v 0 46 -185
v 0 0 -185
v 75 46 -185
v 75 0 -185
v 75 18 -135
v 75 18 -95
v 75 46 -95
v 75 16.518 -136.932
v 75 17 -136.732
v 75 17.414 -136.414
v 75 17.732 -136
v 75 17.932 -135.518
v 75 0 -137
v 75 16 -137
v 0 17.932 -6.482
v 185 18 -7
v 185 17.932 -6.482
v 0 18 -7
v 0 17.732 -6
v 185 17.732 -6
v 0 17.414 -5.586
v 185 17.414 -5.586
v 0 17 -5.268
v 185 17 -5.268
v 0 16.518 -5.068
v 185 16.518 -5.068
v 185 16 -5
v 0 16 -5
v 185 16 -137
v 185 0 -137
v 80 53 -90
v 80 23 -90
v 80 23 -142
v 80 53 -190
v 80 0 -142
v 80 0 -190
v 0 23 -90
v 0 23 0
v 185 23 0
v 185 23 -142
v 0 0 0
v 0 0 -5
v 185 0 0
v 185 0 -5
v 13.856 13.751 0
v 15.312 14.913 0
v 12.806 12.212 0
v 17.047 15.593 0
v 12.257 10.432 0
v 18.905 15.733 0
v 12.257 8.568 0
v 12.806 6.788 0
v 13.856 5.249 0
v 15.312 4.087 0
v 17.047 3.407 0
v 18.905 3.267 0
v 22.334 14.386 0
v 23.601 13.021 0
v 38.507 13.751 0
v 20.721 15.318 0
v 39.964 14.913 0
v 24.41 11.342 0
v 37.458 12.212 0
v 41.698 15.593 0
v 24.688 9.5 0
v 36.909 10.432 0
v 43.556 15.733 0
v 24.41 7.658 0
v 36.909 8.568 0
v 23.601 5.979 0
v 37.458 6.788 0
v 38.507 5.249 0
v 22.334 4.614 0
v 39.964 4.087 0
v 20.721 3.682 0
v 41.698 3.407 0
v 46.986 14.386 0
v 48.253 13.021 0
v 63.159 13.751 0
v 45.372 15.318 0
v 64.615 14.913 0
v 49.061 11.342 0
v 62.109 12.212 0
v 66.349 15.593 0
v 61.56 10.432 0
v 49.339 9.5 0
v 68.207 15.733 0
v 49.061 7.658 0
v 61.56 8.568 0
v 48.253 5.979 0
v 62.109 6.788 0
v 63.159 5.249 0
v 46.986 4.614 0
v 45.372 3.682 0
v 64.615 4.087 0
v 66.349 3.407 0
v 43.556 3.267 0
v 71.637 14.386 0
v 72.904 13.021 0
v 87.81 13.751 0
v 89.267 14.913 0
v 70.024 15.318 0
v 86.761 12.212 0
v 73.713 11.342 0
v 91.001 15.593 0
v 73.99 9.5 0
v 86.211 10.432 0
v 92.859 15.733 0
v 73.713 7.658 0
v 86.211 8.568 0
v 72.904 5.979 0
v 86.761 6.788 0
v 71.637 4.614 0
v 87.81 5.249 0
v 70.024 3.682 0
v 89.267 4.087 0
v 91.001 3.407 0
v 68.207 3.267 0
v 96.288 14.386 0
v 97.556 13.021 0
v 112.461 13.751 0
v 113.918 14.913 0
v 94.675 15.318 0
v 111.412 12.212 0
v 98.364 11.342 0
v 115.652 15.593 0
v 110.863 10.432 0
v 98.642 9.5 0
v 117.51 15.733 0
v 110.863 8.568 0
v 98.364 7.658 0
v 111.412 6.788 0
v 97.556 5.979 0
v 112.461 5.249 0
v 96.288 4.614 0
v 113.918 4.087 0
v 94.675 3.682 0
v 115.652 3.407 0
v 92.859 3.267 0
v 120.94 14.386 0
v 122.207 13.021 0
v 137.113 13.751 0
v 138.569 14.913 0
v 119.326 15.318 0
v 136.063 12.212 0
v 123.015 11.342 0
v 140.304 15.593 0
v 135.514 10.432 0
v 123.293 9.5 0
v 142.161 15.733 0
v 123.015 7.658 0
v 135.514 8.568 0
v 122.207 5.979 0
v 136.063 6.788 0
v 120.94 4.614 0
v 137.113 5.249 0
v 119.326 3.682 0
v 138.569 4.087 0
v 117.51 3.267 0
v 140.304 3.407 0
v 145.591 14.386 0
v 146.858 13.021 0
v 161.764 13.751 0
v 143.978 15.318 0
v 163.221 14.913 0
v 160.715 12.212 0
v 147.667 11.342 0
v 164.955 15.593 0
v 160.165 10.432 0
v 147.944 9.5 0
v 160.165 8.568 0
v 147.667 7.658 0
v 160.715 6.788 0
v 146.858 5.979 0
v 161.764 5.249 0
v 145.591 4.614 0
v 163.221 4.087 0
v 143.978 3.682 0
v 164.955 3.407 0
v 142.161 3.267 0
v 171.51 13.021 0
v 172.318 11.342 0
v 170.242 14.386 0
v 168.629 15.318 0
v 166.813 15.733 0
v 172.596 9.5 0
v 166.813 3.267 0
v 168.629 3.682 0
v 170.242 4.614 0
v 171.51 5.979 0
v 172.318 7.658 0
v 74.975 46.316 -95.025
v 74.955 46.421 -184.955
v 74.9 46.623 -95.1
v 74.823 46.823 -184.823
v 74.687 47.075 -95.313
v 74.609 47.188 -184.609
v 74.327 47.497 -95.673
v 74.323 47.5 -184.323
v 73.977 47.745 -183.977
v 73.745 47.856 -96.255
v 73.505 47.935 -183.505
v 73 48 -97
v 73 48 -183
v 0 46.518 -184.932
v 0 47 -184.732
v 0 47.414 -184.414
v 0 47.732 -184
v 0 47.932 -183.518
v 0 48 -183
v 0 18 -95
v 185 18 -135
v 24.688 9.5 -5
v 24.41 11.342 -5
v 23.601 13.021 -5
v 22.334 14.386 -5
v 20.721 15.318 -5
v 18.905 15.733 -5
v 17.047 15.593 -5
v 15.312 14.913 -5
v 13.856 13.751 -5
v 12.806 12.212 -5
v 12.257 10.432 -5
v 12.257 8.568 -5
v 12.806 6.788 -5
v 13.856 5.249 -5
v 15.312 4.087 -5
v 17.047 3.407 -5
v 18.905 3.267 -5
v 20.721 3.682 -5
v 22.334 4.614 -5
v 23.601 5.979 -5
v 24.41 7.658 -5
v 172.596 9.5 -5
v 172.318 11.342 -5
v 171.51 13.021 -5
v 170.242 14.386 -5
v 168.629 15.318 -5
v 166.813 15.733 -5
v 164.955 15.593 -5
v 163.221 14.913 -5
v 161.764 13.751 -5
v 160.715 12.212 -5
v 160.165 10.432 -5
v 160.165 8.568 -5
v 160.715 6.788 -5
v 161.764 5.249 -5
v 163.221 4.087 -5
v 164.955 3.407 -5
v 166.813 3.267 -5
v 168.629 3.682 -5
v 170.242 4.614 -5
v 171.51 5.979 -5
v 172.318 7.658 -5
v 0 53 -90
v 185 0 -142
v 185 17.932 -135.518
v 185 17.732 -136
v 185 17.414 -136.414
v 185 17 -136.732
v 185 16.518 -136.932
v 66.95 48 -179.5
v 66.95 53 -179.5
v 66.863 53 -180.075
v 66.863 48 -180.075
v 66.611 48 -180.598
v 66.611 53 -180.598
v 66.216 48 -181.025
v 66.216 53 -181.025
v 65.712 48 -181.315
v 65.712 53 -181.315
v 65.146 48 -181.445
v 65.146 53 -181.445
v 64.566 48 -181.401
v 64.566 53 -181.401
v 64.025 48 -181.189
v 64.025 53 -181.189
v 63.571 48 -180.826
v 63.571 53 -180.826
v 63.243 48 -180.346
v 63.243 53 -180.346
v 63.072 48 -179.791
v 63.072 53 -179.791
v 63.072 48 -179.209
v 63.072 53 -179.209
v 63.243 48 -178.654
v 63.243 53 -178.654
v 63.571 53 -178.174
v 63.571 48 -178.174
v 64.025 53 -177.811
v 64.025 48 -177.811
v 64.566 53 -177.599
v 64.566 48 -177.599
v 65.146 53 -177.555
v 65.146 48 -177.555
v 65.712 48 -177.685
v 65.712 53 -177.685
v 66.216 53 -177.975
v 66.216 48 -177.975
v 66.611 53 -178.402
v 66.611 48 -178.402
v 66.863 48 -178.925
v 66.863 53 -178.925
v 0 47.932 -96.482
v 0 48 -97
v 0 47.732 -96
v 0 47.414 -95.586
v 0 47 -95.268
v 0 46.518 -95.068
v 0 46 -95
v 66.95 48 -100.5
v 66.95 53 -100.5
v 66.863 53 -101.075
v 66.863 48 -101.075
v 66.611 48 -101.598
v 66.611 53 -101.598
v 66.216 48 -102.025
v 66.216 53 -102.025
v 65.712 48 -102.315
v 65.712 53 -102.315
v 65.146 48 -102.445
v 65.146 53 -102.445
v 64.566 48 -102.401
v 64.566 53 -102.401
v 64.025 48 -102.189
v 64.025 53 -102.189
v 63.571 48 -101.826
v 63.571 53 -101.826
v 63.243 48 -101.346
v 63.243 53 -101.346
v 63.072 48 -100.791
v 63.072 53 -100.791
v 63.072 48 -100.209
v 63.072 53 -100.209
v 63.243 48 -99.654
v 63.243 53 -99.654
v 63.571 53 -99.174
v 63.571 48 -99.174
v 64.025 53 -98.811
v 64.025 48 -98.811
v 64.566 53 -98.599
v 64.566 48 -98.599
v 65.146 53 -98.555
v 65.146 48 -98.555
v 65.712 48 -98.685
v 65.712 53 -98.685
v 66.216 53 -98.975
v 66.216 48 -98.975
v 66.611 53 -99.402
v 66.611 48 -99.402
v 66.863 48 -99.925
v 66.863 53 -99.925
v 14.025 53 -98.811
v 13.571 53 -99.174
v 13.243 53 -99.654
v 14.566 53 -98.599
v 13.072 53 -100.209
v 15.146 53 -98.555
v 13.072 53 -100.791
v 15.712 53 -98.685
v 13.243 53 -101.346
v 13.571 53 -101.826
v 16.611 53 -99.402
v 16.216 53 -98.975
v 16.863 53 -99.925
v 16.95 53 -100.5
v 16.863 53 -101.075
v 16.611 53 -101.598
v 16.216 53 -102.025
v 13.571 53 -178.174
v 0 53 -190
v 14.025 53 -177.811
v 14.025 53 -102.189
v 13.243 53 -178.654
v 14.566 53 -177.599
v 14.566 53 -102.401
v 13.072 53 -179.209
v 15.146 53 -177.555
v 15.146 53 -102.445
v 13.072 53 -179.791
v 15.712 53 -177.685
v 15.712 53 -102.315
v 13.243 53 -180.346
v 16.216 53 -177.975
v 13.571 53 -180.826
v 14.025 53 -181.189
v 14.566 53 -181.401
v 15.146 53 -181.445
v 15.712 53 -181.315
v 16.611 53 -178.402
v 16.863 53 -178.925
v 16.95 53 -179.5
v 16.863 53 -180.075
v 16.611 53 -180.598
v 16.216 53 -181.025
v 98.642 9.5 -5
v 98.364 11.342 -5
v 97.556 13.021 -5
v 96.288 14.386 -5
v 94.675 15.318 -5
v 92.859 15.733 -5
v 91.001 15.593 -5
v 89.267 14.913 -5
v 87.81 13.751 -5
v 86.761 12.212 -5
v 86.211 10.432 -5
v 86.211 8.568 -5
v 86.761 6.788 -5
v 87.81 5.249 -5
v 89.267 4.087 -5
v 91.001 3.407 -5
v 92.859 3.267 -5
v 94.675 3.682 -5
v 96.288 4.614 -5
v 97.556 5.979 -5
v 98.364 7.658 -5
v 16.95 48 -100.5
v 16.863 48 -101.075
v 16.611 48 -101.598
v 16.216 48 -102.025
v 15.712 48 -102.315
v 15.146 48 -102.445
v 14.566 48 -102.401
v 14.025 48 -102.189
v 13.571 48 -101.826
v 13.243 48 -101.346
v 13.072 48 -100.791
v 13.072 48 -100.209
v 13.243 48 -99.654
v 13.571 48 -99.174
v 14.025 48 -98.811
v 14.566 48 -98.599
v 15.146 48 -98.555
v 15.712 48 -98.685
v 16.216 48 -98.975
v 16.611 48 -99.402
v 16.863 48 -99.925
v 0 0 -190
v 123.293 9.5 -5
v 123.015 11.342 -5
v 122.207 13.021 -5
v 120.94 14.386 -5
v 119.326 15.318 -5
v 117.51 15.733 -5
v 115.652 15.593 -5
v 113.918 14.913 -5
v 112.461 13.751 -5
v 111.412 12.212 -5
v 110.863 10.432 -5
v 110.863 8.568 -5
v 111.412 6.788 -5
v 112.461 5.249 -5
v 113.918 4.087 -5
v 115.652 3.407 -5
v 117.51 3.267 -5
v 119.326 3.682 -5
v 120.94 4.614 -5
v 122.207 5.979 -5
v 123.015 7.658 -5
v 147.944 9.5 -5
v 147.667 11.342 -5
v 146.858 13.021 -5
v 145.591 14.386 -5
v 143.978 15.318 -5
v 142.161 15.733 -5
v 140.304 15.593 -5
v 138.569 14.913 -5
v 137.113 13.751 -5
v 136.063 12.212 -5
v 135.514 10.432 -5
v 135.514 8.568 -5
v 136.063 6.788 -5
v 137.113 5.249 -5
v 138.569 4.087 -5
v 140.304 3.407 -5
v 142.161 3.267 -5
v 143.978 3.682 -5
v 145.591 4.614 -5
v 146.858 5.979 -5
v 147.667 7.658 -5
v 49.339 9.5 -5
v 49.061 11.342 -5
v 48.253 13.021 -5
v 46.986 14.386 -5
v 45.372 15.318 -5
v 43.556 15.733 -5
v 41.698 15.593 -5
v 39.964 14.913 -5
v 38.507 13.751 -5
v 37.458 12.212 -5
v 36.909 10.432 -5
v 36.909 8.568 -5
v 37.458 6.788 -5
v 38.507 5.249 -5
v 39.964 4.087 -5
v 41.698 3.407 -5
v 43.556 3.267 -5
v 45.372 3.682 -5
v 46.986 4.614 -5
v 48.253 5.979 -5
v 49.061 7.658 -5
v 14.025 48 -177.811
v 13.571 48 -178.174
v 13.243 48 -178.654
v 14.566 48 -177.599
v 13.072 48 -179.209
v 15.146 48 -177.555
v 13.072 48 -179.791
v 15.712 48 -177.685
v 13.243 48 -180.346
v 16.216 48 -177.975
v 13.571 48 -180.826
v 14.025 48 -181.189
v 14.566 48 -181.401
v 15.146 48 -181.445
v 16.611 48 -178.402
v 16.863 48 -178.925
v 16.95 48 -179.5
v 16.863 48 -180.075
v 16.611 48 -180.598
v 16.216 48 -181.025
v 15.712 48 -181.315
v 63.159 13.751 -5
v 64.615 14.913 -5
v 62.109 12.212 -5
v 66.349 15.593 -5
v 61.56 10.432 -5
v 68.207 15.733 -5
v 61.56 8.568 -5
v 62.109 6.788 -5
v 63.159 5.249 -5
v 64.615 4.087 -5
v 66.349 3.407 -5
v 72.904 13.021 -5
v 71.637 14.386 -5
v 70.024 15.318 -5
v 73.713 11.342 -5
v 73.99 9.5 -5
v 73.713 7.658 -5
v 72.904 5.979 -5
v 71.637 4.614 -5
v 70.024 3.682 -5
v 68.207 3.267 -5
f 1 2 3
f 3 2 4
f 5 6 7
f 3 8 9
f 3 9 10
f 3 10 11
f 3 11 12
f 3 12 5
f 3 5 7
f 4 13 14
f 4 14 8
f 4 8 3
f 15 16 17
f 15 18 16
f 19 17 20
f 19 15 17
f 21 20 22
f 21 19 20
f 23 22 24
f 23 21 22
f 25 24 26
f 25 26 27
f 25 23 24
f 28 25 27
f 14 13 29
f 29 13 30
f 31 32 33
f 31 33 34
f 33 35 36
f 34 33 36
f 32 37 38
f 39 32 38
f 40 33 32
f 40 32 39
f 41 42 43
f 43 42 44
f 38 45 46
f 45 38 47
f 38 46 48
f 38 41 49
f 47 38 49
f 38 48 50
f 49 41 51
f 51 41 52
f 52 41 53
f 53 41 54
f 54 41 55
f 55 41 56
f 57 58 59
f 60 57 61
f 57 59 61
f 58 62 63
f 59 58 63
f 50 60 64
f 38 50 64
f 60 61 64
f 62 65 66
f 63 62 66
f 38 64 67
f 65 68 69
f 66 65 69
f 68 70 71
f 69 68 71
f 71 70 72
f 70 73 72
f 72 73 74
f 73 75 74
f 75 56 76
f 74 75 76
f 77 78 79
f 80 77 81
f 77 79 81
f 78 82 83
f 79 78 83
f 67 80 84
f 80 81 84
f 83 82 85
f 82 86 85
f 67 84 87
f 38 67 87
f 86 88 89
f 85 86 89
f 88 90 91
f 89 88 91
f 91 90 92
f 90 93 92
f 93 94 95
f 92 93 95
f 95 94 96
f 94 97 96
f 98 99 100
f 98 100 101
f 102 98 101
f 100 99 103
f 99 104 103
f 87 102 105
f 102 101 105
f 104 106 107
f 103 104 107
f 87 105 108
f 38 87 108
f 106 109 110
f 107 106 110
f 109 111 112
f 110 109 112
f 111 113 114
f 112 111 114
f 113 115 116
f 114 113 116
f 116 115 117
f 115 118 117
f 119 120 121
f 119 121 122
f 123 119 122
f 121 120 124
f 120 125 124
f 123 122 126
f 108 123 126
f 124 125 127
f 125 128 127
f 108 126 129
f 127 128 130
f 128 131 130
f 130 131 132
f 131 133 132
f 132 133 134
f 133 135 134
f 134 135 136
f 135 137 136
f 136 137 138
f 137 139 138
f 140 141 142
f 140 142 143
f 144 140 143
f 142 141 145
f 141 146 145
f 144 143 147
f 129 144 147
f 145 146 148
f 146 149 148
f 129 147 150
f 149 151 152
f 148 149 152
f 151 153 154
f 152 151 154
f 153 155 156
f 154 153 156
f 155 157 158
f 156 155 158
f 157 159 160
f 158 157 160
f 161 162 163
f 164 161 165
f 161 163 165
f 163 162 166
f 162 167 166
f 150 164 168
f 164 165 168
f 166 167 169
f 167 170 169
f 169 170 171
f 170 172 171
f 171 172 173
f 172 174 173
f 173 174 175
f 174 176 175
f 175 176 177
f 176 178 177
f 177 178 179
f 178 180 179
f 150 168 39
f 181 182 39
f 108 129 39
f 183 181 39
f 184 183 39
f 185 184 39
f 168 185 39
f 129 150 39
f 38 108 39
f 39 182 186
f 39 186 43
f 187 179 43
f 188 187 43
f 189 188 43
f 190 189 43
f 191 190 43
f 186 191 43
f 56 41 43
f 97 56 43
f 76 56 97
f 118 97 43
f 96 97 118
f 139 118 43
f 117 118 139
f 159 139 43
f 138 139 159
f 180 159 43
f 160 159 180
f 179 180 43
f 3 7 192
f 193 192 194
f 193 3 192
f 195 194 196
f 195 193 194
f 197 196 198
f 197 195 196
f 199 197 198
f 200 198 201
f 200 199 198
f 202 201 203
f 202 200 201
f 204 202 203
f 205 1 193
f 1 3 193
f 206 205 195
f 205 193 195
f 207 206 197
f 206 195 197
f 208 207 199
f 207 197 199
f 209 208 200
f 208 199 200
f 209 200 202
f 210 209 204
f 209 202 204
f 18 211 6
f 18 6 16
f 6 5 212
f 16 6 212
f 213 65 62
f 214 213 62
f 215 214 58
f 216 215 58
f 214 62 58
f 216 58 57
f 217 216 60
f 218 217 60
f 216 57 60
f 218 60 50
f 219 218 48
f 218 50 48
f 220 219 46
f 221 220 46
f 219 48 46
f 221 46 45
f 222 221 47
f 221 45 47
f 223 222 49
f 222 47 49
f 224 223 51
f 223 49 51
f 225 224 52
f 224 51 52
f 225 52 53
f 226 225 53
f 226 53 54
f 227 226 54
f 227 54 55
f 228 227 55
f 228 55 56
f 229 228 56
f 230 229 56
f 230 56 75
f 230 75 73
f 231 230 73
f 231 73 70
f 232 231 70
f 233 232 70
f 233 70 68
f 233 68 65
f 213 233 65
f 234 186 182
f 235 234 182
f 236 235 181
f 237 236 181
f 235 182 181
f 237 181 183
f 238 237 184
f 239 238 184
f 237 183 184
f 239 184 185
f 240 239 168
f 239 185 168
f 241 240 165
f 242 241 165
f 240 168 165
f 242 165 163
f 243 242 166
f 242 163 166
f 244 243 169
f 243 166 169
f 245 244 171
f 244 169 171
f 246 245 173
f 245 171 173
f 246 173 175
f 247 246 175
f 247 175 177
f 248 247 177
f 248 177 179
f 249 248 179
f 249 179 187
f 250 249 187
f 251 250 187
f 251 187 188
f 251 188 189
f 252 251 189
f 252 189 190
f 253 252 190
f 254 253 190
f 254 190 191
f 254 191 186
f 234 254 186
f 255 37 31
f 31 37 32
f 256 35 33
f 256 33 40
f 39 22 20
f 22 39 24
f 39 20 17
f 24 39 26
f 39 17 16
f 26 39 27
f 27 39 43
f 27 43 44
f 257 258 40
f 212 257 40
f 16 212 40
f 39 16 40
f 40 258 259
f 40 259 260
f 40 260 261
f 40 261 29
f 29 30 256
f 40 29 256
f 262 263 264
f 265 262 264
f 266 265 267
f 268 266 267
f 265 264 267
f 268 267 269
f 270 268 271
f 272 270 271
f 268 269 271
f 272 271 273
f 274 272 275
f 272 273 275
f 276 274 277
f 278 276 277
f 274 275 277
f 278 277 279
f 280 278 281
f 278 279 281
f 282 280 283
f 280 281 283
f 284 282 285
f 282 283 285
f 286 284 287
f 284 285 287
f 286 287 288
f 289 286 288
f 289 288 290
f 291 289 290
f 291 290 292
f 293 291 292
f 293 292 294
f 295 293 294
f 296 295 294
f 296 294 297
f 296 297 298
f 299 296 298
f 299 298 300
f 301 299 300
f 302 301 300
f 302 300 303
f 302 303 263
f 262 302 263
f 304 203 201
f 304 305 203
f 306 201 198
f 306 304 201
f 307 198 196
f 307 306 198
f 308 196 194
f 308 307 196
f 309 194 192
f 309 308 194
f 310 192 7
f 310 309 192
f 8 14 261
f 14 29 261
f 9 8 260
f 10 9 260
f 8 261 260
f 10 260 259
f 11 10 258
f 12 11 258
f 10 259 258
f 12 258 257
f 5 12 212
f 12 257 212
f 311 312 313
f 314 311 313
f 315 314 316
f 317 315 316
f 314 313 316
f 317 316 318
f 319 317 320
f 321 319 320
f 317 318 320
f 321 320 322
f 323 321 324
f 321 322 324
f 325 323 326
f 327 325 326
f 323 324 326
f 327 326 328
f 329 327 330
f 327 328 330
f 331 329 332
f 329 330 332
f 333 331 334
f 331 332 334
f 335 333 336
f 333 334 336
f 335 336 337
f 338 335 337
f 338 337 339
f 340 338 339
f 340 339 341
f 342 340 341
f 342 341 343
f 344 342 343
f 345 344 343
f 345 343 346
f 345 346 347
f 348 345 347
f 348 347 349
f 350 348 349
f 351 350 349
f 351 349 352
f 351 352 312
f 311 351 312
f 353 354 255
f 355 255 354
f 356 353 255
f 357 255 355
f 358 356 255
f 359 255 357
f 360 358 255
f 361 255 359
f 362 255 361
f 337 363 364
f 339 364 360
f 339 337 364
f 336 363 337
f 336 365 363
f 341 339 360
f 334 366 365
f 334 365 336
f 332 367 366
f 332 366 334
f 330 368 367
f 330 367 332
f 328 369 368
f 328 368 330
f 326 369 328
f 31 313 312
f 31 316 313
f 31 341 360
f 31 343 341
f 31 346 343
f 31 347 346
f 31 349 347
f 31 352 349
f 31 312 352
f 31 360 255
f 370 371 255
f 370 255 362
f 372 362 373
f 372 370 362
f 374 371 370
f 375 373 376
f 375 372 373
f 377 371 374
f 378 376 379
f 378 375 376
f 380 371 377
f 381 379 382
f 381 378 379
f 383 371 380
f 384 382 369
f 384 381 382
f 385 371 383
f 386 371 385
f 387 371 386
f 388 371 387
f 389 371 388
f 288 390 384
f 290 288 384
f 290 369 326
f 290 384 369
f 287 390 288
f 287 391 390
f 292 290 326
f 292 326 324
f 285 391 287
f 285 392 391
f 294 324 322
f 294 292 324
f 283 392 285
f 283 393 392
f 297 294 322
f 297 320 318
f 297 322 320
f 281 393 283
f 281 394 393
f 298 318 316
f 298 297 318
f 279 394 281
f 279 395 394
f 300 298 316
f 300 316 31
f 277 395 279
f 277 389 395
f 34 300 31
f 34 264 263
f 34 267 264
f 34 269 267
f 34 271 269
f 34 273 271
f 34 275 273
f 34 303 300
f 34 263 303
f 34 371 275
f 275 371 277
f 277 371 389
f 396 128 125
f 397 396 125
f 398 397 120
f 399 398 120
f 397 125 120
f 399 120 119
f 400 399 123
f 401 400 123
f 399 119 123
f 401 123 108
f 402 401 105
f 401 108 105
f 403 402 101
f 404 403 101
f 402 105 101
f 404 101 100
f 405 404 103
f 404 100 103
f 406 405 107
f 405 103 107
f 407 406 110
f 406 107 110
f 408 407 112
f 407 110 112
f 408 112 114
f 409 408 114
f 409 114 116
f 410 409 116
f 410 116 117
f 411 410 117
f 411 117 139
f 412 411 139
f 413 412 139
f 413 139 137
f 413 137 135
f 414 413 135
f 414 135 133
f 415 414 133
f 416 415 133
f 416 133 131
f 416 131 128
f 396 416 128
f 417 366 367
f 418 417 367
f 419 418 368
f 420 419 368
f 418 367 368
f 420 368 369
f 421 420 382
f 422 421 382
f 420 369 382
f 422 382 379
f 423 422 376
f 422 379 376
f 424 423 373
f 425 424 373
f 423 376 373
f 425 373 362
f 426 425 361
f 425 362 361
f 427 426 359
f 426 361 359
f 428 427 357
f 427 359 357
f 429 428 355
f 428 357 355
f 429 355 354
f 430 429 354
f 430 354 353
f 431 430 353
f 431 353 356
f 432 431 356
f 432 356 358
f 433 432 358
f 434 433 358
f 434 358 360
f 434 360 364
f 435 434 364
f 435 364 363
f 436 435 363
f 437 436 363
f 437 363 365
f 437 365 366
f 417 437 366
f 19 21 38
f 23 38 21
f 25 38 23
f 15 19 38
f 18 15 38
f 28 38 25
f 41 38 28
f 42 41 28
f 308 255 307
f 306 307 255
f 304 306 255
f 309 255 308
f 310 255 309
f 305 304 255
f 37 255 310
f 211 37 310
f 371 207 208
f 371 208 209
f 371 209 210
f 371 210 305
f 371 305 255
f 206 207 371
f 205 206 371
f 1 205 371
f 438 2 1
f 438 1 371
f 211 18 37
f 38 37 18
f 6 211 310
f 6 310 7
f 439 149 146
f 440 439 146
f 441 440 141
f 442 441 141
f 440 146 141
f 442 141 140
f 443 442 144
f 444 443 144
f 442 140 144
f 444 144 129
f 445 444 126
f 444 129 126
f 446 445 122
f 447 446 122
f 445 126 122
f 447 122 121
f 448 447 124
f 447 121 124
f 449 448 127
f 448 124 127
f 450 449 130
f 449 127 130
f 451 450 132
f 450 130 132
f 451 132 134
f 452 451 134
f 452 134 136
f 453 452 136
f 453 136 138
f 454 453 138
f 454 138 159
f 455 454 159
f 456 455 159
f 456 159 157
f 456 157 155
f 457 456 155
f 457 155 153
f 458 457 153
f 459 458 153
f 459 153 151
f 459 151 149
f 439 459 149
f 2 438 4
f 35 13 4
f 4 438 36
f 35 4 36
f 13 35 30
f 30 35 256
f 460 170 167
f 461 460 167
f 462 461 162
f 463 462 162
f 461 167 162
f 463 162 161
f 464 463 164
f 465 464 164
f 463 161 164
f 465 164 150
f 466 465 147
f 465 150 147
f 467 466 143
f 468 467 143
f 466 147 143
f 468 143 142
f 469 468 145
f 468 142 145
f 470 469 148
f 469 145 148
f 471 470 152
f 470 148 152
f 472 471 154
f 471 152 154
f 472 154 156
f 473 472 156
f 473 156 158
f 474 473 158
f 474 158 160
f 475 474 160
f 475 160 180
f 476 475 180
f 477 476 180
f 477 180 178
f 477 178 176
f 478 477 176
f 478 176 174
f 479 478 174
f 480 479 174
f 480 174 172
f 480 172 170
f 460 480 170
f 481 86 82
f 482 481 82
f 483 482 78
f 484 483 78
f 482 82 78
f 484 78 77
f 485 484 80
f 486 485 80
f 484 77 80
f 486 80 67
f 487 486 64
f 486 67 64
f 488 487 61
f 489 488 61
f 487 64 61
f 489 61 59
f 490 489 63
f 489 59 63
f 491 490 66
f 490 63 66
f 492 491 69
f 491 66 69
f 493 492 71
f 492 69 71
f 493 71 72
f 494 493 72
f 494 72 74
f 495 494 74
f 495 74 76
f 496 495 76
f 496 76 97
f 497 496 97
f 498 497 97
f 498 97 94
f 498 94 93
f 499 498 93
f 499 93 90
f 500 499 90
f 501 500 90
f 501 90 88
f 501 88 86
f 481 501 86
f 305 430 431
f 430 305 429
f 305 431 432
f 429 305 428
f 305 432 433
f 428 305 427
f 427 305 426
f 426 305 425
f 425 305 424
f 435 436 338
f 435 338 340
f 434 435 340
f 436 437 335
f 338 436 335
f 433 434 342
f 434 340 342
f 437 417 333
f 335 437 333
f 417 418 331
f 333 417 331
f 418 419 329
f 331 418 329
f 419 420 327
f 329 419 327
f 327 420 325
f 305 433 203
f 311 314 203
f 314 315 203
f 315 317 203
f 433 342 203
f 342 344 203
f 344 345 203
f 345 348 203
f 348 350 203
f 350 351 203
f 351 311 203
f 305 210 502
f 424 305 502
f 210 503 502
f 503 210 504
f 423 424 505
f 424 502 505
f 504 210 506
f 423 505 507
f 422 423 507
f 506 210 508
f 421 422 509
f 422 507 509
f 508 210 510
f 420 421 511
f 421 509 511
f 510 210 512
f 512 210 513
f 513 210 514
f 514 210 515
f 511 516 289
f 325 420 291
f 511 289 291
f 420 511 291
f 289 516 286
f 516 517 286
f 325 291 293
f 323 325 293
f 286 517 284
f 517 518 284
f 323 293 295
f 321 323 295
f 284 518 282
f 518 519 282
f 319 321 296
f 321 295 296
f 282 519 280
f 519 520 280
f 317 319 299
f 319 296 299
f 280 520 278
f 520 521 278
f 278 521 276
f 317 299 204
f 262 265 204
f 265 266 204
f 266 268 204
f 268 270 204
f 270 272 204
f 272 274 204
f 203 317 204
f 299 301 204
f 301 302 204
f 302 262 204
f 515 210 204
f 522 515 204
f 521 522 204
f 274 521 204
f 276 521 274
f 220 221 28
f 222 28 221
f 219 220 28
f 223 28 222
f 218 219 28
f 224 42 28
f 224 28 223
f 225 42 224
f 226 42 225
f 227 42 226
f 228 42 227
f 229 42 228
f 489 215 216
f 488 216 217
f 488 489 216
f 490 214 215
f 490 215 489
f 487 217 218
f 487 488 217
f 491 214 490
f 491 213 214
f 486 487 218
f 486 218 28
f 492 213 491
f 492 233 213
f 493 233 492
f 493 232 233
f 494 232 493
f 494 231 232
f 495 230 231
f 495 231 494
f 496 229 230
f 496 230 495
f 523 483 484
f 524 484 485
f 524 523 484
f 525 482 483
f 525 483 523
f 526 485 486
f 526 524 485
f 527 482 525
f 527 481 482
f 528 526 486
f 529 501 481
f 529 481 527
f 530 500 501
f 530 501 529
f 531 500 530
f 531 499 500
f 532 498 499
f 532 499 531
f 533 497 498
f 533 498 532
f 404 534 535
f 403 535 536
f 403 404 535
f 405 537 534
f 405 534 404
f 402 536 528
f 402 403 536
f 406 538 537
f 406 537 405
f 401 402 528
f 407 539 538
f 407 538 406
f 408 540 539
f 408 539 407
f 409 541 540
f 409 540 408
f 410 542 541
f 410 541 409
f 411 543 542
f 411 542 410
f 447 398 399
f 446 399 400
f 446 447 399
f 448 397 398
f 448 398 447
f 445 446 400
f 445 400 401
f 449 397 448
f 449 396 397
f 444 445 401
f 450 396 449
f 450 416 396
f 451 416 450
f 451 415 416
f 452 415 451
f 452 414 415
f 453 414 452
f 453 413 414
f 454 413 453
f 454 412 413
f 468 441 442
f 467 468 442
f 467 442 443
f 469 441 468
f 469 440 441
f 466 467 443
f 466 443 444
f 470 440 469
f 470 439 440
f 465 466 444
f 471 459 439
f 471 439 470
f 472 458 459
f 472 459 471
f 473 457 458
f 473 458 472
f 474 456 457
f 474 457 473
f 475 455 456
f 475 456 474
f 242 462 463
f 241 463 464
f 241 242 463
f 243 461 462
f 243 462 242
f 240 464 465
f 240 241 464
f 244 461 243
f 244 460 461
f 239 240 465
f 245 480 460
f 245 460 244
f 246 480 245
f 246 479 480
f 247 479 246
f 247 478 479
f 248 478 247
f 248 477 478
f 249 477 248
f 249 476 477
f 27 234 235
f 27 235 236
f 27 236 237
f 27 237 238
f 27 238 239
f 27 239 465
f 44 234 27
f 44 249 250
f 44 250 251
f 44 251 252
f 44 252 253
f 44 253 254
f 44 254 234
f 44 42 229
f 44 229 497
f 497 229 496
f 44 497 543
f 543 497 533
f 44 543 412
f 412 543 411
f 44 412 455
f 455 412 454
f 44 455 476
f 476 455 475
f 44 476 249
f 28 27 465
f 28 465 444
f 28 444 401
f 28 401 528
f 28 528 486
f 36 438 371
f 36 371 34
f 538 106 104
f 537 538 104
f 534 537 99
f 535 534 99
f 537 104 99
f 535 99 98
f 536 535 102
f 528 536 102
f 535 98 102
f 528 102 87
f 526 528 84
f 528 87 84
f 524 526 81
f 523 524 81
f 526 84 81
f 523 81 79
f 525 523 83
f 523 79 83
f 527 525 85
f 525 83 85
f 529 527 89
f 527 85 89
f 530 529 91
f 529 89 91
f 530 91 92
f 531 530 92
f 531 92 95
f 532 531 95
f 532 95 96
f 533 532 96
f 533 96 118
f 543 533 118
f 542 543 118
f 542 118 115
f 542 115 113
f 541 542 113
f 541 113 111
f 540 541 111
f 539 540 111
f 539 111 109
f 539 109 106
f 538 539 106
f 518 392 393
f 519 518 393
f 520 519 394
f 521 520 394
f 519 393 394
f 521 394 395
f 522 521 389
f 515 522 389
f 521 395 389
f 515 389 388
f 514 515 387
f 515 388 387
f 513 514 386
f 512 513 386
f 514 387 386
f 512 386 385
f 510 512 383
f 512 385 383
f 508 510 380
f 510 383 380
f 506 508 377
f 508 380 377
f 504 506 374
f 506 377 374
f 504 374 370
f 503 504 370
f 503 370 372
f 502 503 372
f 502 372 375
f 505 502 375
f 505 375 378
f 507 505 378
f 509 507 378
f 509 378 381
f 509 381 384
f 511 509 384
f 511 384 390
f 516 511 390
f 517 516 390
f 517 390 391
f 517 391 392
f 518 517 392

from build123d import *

# Parameters (mm, degrees)
SKETCH1_W           = 185
SKETCH1_H           = 142
BOSS_EXTRUDE1_DEPTH = 23
SKETCH12_W          = 80
SKETCH12_H          = 100
BOSS_EXTRUDE6_DEPTH = 53
SHELL1_T            = -5
SKETCH11_R          = 6.25
CUT_EXTRUDE2_DEPTH  = 6
FILLET1_R           = 2
SKETCH13_R          = 1.95
CUT_EXTRUDE3_DEPTH  = 54


with BuildPart() as part:
    # Sketch1 → Boss-Extrude1 (new body)
    with BuildSketch(Plane(origin=(0, 0, 0), x_dir=(1, 0, 0), z_dir=(0, 1, 0))):
        with Locations((92.5, 71)):
            Rectangle(SKETCH1_W, SKETCH1_H)
    extrude(amount=BOSS_EXTRUDE1_DEPTH)

    # Sketch12 → Boss-Extrude6 (add)
    with BuildSketch(Plane(origin=(0, 0, 0), x_dir=(1, 0, 0), z_dir=(0, 1, 0))):
        with Locations((40, 140)):
            Rectangle(SKETCH12_W, SKETCH12_H)
    extrude(amount=BOSS_EXTRUDE6_DEPTH)

    # Shell1
    shell1_openings = [part.faces().sort_by_distance(p)[0] for p in [
        (88.333333333, 0, -110.666666667),
        (185, 11.5, -71),
        (0, 25.333333333, -93.333333333),
    ]]
    offset(amount=SHELL1_T, openings=shell1_openings, kind=Kind.INTERSECTION)

    # Sketch11 → Cut-Extrude2 (cut)
    with BuildSketch(Plane.XY):
        with Locations((18.4375, 9.5)):
            Circle(SKETCH11_R)
        with Locations((43.088852194, 9.5)):
            Circle(SKETCH11_R)
        with Locations((67.740204388, 9.5)):
            Circle(SKETCH11_R)
        with Locations((92.391556582, 9.5)):
            Circle(SKETCH11_R)
        with Locations((117.042908776, 9.5)):
            Circle(SKETCH11_R)
        with Locations((141.69426097, 9.5)):
            Circle(SKETCH11_R)
        with Locations((166.345613164, 9.5)):
            Circle(SKETCH11_R)
    extrude(amount=-CUT_EXTRUDE2_DEPTH, mode=Mode.SUBTRACT)

    # Fillet1
    fillet1_edges = [part.edges().sort_by_distance(p)[0] for p in [
        (92.5, 18, -5),
        (130, 18, -137),
        (37.5, 48, -95),
        (75, 48, -140),
        (37.5, 48, -185),
    ]]
    fillet(fillet1_edges, radius=FILLET1_R)

    # Sketch13 → Cut-Extrude3 (cut, through all)
    with BuildSketch(Plane(origin=(0, 53, 0), x_dir=(1, 0, 0), z_dir=(0, 1, 0))):
        with Locations((15, 100.5)):
            Circle(SKETCH13_R)
        with Locations((15, 179.5)):
            Circle(SKETCH13_R)
        with Locations((65, 179.5)):
            Circle(SKETCH13_R)
        with Locations((65, 100.5)):
            Circle(SKETCH13_R)
    extrude(amount=-CUT_EXTRUDE3_DEPTH, mode=Mode.SUBTRACT)


solid = part.part
